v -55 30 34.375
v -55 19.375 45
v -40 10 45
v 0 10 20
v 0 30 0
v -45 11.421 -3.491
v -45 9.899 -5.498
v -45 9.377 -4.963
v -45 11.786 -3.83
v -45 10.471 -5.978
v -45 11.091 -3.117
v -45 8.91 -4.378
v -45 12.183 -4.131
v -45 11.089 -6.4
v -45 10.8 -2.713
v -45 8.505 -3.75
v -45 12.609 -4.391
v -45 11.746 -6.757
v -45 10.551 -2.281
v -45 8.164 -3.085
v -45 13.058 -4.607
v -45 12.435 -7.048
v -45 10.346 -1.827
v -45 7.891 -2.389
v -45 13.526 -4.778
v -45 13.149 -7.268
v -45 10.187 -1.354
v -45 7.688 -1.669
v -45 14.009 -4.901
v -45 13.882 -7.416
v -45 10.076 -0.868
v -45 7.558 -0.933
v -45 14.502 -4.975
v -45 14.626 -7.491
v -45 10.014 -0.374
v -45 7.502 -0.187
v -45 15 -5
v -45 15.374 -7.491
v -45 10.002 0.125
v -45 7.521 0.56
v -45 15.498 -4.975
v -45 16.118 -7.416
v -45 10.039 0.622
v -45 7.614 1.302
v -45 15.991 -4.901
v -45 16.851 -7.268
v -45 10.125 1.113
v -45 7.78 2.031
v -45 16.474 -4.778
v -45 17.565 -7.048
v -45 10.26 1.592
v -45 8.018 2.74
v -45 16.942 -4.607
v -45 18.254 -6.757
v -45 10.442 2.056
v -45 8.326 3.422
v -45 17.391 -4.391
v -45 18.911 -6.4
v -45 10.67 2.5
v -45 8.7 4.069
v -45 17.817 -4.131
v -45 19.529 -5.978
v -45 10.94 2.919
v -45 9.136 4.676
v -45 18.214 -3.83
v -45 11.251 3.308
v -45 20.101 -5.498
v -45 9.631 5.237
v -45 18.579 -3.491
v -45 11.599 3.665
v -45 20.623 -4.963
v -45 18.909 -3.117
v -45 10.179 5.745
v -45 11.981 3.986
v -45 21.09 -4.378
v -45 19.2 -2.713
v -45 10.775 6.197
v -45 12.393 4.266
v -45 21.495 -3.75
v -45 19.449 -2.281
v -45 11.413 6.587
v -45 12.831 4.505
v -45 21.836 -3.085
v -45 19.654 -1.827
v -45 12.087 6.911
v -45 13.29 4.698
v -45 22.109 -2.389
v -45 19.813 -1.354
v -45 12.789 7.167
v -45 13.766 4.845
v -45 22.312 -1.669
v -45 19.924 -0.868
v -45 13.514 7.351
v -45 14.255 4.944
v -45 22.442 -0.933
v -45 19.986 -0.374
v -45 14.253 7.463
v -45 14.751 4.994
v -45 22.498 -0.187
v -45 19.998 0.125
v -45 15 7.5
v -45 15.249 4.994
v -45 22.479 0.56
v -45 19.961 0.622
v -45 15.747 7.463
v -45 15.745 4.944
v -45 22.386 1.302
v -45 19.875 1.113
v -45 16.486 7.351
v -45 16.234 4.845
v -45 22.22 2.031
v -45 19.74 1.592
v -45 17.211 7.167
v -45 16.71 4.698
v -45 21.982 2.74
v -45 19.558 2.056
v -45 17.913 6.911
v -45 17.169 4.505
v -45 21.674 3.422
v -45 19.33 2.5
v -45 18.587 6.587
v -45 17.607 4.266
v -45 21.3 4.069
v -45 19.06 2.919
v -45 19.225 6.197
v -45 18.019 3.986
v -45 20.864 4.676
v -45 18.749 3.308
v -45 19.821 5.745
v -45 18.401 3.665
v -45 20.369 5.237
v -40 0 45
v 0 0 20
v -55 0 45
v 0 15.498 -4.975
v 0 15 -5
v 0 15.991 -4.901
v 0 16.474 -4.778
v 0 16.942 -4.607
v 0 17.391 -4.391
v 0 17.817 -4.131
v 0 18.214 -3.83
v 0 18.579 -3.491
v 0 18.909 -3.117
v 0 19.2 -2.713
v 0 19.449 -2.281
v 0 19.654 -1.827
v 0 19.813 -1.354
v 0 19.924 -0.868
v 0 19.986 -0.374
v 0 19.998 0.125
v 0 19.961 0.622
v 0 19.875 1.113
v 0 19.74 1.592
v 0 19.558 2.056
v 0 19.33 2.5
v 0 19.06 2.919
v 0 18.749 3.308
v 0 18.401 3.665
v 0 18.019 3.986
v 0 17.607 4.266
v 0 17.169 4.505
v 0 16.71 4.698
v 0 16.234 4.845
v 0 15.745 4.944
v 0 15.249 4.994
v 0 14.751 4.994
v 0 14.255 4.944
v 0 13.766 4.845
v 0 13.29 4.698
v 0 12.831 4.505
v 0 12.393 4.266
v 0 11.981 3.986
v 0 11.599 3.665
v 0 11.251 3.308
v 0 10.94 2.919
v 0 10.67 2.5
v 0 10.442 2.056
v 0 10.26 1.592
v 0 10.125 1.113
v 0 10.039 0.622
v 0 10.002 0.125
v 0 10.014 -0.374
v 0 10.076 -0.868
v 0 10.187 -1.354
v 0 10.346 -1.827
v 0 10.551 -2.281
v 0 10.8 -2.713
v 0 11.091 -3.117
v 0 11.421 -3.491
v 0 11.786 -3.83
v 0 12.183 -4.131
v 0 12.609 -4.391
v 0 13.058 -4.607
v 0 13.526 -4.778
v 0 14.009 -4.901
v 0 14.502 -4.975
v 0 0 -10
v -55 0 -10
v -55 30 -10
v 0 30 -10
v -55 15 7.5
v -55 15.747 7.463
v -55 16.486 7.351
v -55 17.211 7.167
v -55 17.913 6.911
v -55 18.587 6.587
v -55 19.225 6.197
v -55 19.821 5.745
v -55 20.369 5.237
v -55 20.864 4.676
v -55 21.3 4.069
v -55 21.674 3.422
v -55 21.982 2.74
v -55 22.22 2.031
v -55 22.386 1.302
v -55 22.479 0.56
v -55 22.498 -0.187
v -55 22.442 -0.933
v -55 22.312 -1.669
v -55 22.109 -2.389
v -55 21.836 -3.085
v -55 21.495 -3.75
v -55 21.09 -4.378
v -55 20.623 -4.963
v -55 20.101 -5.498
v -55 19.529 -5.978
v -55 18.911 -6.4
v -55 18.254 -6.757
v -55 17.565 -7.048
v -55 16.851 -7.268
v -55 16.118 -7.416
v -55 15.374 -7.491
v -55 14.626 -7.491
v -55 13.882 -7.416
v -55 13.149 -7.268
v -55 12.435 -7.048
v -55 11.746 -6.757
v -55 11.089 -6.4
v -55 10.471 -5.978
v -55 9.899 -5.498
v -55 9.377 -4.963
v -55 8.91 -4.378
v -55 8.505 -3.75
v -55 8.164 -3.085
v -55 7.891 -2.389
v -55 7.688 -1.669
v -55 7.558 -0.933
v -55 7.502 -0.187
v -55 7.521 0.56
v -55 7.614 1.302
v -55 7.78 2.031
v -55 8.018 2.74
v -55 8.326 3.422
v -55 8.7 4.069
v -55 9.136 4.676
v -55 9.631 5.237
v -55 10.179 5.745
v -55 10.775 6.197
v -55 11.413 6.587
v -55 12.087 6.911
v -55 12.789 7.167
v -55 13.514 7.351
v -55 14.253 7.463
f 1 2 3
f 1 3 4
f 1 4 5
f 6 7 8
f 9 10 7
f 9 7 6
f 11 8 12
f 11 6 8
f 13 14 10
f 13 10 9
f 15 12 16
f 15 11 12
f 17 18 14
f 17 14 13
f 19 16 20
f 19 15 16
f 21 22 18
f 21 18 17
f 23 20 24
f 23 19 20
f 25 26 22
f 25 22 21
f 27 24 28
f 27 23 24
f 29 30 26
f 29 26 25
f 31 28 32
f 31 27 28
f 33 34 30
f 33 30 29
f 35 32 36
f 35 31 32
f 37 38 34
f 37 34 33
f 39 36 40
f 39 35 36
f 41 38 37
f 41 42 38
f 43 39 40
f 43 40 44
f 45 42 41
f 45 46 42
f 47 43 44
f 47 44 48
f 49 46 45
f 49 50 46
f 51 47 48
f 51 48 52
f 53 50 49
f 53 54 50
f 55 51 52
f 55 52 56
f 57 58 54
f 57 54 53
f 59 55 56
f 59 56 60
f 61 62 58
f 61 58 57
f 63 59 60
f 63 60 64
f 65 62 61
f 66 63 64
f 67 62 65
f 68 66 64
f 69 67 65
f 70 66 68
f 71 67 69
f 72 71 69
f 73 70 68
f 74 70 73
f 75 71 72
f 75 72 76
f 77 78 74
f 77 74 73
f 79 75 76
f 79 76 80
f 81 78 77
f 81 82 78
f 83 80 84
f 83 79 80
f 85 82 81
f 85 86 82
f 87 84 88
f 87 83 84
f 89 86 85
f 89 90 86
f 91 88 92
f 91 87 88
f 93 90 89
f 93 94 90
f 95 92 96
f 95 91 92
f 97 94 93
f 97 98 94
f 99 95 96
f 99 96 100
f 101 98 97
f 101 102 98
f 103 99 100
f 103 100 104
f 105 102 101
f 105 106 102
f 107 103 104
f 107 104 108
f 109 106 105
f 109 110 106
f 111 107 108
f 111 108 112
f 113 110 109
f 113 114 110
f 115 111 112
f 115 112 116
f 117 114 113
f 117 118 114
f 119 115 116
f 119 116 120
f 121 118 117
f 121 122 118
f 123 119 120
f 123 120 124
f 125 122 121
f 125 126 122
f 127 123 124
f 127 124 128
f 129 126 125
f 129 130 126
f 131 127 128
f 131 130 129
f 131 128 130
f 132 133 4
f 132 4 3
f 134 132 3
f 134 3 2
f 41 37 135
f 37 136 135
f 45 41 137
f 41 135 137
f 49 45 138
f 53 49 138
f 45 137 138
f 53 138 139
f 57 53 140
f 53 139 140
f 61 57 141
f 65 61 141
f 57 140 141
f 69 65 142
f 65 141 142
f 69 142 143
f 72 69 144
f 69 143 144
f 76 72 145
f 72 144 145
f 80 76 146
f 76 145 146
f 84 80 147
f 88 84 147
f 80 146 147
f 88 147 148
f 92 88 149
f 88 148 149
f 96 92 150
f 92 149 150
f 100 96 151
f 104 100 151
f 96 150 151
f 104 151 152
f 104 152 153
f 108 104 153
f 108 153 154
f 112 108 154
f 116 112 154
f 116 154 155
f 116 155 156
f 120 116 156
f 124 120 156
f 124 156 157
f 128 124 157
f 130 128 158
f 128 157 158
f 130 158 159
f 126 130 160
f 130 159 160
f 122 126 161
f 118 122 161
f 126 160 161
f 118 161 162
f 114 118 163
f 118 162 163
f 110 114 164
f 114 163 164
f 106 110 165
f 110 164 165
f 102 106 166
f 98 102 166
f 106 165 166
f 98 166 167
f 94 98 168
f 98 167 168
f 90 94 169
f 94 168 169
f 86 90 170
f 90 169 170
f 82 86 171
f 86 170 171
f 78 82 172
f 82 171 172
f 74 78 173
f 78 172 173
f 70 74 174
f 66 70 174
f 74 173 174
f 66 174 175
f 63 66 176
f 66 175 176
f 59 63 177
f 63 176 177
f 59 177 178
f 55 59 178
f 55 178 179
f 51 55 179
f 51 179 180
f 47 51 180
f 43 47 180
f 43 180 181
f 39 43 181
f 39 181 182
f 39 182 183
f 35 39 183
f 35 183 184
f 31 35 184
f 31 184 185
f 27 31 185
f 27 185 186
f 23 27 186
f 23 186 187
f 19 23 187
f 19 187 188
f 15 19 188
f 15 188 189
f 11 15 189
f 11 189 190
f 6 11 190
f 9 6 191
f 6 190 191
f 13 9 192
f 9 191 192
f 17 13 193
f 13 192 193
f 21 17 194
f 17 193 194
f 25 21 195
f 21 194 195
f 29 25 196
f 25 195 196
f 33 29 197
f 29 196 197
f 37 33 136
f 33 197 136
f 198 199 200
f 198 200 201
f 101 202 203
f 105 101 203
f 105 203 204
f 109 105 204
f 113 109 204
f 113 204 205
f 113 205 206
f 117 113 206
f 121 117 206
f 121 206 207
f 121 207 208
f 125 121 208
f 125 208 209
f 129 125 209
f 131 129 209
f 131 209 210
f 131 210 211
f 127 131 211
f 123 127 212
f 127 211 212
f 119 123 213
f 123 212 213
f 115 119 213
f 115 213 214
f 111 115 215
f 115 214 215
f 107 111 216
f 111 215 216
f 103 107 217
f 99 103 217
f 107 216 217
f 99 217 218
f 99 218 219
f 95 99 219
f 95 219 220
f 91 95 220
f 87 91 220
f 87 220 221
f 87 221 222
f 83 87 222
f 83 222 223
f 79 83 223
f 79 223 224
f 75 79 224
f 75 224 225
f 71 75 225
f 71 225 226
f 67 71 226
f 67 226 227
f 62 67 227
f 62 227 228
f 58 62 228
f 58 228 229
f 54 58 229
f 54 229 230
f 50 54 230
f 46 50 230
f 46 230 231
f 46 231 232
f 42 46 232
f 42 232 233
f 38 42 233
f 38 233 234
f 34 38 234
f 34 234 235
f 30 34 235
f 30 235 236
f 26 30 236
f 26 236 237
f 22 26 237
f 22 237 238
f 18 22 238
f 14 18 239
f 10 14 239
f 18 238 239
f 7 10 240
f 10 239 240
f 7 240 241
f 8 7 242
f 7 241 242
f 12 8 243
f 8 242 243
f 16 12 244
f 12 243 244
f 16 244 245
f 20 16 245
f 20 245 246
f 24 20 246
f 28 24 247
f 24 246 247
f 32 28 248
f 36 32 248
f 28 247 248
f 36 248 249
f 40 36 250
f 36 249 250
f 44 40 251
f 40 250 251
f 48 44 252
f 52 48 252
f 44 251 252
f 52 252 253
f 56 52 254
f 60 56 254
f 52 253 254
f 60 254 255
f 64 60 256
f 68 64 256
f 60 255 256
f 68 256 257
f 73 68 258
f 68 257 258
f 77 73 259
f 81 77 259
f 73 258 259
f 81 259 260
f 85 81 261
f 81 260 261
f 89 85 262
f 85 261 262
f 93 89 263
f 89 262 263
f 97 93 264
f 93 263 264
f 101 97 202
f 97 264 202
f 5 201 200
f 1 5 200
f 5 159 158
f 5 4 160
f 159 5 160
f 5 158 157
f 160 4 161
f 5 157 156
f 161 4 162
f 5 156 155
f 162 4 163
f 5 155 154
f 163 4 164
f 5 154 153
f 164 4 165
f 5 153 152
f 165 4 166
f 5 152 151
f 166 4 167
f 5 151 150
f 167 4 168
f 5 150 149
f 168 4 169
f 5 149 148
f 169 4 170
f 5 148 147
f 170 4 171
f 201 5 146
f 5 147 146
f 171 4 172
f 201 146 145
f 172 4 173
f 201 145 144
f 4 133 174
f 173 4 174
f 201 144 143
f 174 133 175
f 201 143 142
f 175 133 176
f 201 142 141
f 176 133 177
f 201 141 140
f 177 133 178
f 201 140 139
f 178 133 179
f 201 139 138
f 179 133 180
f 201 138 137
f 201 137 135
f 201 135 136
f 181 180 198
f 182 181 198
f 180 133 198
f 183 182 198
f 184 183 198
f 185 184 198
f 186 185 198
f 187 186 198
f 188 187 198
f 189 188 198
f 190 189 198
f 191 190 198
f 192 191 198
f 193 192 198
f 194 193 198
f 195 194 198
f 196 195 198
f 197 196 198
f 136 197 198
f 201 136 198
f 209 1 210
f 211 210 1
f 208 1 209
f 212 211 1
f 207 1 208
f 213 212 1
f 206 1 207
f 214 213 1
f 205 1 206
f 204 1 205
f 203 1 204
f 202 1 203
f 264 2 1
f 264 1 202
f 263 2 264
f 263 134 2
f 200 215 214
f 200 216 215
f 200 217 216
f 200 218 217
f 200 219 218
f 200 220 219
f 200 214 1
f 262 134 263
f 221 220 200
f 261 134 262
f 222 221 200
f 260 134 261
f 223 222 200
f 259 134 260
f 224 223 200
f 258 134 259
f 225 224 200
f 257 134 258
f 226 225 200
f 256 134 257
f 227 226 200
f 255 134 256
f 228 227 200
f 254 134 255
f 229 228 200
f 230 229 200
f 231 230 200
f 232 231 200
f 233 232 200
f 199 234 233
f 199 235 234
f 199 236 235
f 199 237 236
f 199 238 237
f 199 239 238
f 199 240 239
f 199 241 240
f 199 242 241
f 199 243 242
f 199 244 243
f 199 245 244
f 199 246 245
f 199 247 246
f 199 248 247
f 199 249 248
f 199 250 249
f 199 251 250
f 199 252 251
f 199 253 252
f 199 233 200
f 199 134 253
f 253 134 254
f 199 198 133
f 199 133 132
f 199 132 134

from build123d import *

# Parameters (mm, degrees)
BOSS_EXTRUDE1_DEPTH = 30
INTERSECT1_START    = -64
INTERSECT1_DEPTH    = 64
HOLE1_D             = 10
HOLE1_CBORE_D       = 15
HOLE1_CBORE_DEPTH   = 10


with BuildPart() as part:
    # Sketch2 → Boss-Extrude1 (new body)
    with BuildSketch(Plane(origin=(0, 0, 0), x_dir=(1, 0, 0), z_dir=(0, 1, 0))):
        Polygon((0, 10), (0, 0), (0, -20), (-40, -45), (-55, -45), (-55, 10), align=None)
    extrude(amount=BOSS_EXTRUDE1_DEPTH)

    # Intersect1: read off the stored shape, not the designer's step
    # Intersect1 outline → Intersect1 (cut)
    with BuildSketch(Plane(origin=(0, 0, 0), x_dir=(0.5299989400031803, 0.8479983040050878, 0), z_dir=(0.8479983040050877, -0.5299989400031807, 0)).offset(INTERSECT1_START)):
        Polygon((-12.71997456, 45), (26.287947424, -1), (27, -1), (27, 45), align=None)
    extrude(amount=INTERSECT1_DEPTH, mode=Mode.SUBTRACT)

    # Hole1 (through all)
    with Locations(Plane.ZY.offset(55)):
        with Locations((0, 15)):
            CounterBoreHole(HOLE1_D / 2, HOLE1_CBORE_D / 2, HOLE1_CBORE_DEPTH)


solid = part.part
